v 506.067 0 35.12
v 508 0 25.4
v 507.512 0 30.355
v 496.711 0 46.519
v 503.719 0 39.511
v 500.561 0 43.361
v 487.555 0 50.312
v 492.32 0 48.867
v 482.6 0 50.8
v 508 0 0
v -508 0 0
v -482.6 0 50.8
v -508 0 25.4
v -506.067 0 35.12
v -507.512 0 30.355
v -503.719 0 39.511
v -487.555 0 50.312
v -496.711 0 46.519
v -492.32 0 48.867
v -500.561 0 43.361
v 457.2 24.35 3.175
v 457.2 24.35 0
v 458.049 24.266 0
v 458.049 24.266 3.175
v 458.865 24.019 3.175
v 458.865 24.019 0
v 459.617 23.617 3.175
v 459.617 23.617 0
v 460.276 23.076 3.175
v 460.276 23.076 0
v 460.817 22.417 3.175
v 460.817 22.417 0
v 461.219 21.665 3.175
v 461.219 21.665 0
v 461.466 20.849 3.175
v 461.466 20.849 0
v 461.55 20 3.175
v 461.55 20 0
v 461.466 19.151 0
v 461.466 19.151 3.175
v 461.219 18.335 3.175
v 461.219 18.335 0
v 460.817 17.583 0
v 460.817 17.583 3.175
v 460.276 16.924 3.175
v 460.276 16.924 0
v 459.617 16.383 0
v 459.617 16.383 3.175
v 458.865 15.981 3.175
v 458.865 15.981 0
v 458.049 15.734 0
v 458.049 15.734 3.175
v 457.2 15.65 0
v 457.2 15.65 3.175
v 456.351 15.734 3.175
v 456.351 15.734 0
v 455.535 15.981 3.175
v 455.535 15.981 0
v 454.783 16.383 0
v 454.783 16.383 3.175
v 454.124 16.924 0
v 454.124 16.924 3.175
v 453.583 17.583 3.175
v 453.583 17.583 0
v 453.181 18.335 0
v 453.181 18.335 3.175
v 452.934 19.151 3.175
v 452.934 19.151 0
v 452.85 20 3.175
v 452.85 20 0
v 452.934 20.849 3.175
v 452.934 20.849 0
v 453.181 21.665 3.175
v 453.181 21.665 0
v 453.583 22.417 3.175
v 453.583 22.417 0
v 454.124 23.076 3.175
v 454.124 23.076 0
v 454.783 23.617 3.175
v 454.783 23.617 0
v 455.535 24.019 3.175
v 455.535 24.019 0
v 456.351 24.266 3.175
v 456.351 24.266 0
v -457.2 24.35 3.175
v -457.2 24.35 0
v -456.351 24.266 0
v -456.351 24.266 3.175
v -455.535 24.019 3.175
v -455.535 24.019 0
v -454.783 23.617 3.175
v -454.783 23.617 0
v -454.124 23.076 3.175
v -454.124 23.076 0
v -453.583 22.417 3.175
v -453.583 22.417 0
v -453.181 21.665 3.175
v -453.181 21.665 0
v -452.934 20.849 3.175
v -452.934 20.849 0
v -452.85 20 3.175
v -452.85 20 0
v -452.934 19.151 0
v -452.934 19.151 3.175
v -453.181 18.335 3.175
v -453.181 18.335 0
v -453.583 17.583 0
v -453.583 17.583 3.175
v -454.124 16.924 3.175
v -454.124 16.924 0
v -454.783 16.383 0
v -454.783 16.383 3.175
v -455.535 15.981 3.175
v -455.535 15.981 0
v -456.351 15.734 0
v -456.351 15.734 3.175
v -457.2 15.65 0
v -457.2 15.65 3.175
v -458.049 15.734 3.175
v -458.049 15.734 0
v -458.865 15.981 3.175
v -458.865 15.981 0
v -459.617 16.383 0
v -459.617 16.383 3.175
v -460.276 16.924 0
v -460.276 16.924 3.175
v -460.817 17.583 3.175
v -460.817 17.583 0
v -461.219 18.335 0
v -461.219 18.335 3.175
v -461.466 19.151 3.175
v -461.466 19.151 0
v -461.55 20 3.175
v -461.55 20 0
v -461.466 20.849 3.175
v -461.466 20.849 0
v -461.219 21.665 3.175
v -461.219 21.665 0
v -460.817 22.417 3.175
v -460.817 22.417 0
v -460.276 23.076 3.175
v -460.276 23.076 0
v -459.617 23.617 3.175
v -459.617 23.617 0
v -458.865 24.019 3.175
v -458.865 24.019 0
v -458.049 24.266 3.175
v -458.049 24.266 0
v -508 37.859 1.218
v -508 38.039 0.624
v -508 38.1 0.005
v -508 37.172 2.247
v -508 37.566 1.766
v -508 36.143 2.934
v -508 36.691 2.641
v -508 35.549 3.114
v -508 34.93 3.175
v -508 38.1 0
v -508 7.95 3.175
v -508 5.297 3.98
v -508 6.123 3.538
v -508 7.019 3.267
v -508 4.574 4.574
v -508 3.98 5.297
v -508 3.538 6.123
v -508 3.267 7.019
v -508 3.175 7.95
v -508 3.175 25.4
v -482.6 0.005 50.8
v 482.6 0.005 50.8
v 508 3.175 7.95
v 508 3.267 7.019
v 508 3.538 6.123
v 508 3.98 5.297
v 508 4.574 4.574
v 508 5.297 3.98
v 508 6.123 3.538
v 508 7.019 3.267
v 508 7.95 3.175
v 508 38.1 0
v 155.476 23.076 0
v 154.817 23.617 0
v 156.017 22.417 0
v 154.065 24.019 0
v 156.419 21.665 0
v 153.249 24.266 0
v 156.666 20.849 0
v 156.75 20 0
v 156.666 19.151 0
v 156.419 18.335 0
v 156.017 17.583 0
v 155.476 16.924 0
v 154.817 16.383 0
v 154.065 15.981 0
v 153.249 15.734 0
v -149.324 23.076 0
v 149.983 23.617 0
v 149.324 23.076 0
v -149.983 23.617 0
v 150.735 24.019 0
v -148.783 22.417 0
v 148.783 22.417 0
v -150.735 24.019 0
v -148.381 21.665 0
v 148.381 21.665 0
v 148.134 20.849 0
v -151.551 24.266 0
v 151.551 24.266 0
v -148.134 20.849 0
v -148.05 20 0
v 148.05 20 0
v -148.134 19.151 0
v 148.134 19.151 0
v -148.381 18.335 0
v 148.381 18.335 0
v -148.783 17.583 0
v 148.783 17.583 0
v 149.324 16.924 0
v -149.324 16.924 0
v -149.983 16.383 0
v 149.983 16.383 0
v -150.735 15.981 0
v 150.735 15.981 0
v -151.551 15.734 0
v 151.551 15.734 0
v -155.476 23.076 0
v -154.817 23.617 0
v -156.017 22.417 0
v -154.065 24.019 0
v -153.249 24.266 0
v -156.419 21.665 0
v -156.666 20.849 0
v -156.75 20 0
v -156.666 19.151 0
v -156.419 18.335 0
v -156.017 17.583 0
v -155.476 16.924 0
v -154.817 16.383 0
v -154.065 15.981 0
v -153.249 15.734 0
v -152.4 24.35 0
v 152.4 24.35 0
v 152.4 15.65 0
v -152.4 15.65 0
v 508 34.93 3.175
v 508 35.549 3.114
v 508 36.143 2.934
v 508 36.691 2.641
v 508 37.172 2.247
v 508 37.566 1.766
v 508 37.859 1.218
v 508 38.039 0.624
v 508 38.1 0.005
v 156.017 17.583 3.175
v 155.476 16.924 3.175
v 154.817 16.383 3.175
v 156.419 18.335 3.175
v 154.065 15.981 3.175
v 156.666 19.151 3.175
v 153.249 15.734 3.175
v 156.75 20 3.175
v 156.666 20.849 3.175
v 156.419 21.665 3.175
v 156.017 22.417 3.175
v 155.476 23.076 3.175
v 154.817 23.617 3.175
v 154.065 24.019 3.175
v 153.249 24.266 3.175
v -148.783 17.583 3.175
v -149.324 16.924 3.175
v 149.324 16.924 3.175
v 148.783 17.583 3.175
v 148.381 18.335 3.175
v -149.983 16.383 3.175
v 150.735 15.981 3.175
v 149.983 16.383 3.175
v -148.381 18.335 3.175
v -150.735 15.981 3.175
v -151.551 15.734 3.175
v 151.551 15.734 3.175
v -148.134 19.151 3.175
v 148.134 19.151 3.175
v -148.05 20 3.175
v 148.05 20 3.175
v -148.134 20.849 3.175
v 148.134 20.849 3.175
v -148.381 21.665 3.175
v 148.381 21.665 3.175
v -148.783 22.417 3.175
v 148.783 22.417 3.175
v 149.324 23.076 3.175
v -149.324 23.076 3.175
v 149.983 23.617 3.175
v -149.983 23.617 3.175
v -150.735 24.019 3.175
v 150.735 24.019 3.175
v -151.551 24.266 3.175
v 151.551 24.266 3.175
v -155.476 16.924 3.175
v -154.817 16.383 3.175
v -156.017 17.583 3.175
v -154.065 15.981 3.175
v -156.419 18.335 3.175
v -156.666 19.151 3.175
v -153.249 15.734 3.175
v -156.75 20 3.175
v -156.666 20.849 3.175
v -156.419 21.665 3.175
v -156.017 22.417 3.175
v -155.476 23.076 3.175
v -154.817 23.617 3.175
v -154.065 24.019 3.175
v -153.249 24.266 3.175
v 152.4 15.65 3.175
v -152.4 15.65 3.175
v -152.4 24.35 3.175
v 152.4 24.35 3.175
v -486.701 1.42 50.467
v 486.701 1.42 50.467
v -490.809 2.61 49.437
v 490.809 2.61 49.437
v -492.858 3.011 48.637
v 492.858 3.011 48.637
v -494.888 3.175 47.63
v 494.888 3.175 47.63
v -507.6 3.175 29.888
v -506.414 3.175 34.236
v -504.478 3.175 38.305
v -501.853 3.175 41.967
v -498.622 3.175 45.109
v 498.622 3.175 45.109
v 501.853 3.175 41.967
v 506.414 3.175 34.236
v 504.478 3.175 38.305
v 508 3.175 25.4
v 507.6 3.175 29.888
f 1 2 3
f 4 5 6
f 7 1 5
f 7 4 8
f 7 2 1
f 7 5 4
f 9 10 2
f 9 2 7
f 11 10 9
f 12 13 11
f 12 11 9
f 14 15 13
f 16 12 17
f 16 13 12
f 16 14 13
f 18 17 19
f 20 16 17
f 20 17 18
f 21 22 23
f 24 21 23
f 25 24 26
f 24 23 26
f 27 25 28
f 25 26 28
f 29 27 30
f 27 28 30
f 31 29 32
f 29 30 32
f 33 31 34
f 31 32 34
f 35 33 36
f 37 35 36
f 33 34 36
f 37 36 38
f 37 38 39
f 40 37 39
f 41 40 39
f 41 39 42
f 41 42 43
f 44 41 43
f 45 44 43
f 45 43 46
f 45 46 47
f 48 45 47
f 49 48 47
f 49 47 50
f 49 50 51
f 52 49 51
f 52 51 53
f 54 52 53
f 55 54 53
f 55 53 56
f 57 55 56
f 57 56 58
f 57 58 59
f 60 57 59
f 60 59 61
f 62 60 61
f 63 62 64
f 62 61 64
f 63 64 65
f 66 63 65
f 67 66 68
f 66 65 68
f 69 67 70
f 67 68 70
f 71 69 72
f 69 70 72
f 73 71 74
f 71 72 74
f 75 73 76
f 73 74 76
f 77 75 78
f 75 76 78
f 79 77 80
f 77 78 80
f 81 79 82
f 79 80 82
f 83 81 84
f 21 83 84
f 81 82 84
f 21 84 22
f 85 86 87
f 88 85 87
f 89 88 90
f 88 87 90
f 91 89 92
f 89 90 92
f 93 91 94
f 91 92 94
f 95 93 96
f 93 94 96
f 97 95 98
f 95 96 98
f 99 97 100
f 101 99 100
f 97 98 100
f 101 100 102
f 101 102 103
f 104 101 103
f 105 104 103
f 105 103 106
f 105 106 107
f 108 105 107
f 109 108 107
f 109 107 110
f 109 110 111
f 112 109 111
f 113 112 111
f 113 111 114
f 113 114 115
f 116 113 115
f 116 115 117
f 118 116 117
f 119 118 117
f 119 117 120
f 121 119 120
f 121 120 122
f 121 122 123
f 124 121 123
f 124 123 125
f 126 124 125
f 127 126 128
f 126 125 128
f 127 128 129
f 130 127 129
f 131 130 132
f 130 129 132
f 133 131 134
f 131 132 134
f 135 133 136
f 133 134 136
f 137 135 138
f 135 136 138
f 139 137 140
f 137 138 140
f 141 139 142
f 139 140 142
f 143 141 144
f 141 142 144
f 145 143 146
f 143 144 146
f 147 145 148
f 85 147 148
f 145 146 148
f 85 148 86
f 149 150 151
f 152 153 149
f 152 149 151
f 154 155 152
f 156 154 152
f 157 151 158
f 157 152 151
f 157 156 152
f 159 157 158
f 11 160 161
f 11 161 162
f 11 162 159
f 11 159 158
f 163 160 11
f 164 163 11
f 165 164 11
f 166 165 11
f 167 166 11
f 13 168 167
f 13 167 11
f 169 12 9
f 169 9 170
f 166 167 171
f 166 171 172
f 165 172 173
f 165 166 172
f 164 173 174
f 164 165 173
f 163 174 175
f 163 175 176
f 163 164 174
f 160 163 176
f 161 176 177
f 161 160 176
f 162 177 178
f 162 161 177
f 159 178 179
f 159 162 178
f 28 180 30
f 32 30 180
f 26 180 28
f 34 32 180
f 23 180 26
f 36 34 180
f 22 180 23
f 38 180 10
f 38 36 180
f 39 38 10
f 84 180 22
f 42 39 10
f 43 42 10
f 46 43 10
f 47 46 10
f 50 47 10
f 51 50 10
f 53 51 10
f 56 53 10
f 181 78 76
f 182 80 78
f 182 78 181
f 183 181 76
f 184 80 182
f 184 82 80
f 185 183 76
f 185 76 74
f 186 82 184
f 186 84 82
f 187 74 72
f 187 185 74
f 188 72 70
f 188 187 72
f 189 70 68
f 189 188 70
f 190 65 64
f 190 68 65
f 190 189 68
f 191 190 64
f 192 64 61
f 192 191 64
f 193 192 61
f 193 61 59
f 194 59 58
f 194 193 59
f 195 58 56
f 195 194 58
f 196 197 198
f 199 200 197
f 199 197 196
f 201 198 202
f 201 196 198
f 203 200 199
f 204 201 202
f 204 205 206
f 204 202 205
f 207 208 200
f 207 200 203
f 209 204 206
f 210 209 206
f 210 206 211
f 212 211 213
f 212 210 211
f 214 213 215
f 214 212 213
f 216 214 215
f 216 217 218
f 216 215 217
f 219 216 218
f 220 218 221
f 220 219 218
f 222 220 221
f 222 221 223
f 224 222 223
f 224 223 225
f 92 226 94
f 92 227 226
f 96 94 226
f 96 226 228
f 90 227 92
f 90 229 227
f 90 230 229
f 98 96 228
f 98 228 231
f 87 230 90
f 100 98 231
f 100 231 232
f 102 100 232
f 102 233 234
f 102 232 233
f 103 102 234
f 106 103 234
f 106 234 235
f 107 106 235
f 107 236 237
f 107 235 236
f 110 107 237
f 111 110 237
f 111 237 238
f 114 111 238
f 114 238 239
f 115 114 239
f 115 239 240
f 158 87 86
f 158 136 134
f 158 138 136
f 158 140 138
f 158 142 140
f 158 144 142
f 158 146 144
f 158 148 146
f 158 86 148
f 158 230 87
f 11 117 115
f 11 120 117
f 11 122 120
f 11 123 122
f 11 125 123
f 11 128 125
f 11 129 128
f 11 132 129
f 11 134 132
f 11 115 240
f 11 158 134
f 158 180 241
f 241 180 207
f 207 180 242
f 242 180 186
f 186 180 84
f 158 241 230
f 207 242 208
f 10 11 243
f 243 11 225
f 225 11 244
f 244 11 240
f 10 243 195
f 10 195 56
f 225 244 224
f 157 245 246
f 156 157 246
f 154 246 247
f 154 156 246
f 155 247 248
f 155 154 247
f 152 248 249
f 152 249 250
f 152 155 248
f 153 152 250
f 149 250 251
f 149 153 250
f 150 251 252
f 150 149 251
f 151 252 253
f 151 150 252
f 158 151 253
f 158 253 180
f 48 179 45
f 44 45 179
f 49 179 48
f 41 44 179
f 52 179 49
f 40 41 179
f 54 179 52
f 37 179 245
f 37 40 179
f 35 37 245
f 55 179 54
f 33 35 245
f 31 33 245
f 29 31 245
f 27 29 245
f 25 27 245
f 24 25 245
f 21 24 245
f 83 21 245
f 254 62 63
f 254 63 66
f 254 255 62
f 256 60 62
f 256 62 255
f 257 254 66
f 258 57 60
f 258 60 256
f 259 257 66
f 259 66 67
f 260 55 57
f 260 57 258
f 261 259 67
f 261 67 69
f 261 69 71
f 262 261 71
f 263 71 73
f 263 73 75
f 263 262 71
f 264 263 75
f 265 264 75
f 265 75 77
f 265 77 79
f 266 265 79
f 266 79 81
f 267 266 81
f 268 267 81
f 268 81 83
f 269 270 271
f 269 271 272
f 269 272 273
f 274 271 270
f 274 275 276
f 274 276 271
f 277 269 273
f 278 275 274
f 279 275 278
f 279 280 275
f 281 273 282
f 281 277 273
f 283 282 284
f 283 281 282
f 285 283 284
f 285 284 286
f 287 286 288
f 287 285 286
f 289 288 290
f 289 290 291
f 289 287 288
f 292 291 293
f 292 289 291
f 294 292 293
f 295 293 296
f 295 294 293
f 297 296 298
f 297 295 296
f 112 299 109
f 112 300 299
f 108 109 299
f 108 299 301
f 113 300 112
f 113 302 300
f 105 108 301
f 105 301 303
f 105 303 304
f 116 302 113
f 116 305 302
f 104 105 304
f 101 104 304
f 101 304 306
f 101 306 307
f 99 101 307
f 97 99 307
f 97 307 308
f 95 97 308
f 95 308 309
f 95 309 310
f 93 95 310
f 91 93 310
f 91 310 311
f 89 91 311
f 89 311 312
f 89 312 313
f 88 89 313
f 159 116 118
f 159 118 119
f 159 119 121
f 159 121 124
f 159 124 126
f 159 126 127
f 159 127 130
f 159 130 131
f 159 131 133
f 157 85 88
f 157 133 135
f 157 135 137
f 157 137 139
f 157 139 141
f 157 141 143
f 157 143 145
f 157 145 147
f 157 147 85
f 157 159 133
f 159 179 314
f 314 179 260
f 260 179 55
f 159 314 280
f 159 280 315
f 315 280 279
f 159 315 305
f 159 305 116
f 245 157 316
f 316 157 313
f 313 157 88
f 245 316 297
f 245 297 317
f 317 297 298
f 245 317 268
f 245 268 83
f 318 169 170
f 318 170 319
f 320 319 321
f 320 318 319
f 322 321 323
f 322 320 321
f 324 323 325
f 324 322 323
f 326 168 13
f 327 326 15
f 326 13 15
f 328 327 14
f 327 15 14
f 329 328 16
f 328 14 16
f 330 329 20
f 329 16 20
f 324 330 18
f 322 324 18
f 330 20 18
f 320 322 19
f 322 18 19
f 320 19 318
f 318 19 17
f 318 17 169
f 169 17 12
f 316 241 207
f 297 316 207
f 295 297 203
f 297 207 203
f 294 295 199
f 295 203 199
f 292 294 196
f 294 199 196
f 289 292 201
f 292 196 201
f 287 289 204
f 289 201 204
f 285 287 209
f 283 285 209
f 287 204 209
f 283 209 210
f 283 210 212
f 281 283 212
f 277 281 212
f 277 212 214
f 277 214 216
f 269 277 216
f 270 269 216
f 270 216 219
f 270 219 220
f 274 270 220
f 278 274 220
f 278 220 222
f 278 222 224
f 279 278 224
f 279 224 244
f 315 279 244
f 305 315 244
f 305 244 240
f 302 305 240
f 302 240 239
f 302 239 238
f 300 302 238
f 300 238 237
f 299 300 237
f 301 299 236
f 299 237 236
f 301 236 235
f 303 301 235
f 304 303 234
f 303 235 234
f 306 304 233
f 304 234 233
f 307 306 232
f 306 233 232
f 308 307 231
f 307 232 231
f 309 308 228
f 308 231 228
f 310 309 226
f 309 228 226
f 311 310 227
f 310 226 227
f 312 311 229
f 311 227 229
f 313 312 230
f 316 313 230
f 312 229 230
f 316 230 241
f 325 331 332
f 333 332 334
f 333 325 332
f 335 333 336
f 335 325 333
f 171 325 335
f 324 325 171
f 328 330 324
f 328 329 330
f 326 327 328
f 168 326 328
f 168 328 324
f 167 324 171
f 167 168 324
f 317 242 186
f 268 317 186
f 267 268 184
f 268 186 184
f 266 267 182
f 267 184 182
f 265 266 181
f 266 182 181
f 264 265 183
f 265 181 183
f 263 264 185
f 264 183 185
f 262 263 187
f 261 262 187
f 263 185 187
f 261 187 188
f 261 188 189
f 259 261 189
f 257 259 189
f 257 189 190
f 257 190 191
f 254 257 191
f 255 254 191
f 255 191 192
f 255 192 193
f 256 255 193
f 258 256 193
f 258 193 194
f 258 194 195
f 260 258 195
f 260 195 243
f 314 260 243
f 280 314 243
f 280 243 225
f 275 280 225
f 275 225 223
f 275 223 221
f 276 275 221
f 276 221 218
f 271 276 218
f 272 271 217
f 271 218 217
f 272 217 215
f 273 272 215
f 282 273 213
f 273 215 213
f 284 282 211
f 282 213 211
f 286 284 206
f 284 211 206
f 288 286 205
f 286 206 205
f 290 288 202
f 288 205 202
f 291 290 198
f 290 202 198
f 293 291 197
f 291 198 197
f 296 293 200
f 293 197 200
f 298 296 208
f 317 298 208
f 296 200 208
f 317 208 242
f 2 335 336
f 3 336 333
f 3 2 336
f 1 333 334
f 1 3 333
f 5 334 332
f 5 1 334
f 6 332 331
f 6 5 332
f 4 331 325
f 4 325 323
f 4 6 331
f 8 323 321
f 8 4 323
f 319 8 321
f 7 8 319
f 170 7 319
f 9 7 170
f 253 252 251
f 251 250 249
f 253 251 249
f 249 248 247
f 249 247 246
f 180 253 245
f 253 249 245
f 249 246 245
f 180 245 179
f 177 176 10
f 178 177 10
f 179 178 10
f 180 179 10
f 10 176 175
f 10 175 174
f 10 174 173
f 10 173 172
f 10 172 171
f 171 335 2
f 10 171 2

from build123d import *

# Parameters (mm, degrees)
AL_L_ANGLE_ROUNDED_ENDS_L2X1_5X0_125_1_DEPTH = 1016
CUT_EXTRUDE1_DEPTH                           = 512.9533670169578
SKETCH14_R                                   = 4.349749999999978
CUT_EXTRUDE2_DEPTH                           = 512.9533671261084


with BuildPart() as part:
    # Sketch12 → Al l angle (rounded ends) L2X1.5X0.125(1) (new body)
    with BuildSketch(Plane.YZ.offset(-508)):
        with BuildLine():
            Line((0, 0), (-6.94e-15, 50.79999999999999))
            Line((-6.94e-15, 50.79999999999999), (0.00507999999999065, 50.79999999999999))
            ThreePointArc((0.00507999999999065, 50.79999999999999), (2.24655192781885, 49.87155192781885), (3.174999999999991, 47.63007999999999))
            Line((3.174999999999991, 47.63007999999999), (3.1749999999999825, 7.950199999999994))
            ThreePointArc((3.1749999999999825, 7.950199999999994), (4.573623698477981, 4.573623698477992), (7.950199999999982, 3.1749999999999945))
            Line((7.950199999999982, 3.1749999999999945), (34.93008, 3.174999999999994))
            ThreePointArc((34.93008, 3.174999999999994), (37.171551927818854, 2.246551927818857), (38.099999999999994, 0.00507999999999845))
            Line((38.099999999999994, 0.00507999999999845), (38.099999999999994, -1.56e-15))
            Line((38.099999999999994, -1.56e-15), (0, 0))
        make_face()
    extrude(amount=AL_L_ANGLE_ROUNDED_ENDS_L2X1_5X0_125_1_DEPTH)

    # Sketch13 → Cut-Extrude1 (cut, through all)
    with BuildSketch(Plane.XZ):
        with BuildLine():
            Line((-508, 50.79999999999999), (-508, 25.399999999999984))
            ThreePointArc((-508, 25.399999999999984), (-500.5605122421383, 43.3605122421383), (-482.6, 50.79999999999999))
            Line((-482.6, 50.79999999999999), (-508, 50.79999999999999))
        make_face()
        with BuildLine():
            Line((508, 50.79999999999999), (508, 25.399999999999984))
            ThreePointArc((508, 25.399999999999984), (500.5605122421383, 43.3605122421383), (482.6, 50.79999999999999))
            Line((482.6, 50.79999999999999), (508, 50.79999999999999))
        make_face()
    extrude(amount=-CUT_EXTRUDE1_DEPTH, mode=Mode.SUBTRACT)

    # Sketch14 → Cut-Extrude2 (cut, through all)
    with BuildSketch(Plane(origin=(0, 0, 0), x_dir=(-1, 0, 0), z_dir=(0, -4e-17, -1))):
        with Locations(Location((457.20000000000005, 20.000000000006384, 0), (0, 0, 90))):
            Circle(SKETCH14_R)
        with Locations(Location((152.40000000000003, 20.000000000004256, 0), (0, 0, 90))):
            Circle(SKETCH14_R)
        with Locations(Location((-152.39999999999998, 20.000000000002128, 0), (0, 0, 90))):
            Circle(SKETCH14_R)
        with Locations(Location((-457.20000000000005, 20, 0), (0, 0, 90))):
            Circle(SKETCH14_R)
    extrude(amount=-CUT_EXTRUDE2_DEPTH, mode=Mode.SUBTRACT)


solid = part.part
